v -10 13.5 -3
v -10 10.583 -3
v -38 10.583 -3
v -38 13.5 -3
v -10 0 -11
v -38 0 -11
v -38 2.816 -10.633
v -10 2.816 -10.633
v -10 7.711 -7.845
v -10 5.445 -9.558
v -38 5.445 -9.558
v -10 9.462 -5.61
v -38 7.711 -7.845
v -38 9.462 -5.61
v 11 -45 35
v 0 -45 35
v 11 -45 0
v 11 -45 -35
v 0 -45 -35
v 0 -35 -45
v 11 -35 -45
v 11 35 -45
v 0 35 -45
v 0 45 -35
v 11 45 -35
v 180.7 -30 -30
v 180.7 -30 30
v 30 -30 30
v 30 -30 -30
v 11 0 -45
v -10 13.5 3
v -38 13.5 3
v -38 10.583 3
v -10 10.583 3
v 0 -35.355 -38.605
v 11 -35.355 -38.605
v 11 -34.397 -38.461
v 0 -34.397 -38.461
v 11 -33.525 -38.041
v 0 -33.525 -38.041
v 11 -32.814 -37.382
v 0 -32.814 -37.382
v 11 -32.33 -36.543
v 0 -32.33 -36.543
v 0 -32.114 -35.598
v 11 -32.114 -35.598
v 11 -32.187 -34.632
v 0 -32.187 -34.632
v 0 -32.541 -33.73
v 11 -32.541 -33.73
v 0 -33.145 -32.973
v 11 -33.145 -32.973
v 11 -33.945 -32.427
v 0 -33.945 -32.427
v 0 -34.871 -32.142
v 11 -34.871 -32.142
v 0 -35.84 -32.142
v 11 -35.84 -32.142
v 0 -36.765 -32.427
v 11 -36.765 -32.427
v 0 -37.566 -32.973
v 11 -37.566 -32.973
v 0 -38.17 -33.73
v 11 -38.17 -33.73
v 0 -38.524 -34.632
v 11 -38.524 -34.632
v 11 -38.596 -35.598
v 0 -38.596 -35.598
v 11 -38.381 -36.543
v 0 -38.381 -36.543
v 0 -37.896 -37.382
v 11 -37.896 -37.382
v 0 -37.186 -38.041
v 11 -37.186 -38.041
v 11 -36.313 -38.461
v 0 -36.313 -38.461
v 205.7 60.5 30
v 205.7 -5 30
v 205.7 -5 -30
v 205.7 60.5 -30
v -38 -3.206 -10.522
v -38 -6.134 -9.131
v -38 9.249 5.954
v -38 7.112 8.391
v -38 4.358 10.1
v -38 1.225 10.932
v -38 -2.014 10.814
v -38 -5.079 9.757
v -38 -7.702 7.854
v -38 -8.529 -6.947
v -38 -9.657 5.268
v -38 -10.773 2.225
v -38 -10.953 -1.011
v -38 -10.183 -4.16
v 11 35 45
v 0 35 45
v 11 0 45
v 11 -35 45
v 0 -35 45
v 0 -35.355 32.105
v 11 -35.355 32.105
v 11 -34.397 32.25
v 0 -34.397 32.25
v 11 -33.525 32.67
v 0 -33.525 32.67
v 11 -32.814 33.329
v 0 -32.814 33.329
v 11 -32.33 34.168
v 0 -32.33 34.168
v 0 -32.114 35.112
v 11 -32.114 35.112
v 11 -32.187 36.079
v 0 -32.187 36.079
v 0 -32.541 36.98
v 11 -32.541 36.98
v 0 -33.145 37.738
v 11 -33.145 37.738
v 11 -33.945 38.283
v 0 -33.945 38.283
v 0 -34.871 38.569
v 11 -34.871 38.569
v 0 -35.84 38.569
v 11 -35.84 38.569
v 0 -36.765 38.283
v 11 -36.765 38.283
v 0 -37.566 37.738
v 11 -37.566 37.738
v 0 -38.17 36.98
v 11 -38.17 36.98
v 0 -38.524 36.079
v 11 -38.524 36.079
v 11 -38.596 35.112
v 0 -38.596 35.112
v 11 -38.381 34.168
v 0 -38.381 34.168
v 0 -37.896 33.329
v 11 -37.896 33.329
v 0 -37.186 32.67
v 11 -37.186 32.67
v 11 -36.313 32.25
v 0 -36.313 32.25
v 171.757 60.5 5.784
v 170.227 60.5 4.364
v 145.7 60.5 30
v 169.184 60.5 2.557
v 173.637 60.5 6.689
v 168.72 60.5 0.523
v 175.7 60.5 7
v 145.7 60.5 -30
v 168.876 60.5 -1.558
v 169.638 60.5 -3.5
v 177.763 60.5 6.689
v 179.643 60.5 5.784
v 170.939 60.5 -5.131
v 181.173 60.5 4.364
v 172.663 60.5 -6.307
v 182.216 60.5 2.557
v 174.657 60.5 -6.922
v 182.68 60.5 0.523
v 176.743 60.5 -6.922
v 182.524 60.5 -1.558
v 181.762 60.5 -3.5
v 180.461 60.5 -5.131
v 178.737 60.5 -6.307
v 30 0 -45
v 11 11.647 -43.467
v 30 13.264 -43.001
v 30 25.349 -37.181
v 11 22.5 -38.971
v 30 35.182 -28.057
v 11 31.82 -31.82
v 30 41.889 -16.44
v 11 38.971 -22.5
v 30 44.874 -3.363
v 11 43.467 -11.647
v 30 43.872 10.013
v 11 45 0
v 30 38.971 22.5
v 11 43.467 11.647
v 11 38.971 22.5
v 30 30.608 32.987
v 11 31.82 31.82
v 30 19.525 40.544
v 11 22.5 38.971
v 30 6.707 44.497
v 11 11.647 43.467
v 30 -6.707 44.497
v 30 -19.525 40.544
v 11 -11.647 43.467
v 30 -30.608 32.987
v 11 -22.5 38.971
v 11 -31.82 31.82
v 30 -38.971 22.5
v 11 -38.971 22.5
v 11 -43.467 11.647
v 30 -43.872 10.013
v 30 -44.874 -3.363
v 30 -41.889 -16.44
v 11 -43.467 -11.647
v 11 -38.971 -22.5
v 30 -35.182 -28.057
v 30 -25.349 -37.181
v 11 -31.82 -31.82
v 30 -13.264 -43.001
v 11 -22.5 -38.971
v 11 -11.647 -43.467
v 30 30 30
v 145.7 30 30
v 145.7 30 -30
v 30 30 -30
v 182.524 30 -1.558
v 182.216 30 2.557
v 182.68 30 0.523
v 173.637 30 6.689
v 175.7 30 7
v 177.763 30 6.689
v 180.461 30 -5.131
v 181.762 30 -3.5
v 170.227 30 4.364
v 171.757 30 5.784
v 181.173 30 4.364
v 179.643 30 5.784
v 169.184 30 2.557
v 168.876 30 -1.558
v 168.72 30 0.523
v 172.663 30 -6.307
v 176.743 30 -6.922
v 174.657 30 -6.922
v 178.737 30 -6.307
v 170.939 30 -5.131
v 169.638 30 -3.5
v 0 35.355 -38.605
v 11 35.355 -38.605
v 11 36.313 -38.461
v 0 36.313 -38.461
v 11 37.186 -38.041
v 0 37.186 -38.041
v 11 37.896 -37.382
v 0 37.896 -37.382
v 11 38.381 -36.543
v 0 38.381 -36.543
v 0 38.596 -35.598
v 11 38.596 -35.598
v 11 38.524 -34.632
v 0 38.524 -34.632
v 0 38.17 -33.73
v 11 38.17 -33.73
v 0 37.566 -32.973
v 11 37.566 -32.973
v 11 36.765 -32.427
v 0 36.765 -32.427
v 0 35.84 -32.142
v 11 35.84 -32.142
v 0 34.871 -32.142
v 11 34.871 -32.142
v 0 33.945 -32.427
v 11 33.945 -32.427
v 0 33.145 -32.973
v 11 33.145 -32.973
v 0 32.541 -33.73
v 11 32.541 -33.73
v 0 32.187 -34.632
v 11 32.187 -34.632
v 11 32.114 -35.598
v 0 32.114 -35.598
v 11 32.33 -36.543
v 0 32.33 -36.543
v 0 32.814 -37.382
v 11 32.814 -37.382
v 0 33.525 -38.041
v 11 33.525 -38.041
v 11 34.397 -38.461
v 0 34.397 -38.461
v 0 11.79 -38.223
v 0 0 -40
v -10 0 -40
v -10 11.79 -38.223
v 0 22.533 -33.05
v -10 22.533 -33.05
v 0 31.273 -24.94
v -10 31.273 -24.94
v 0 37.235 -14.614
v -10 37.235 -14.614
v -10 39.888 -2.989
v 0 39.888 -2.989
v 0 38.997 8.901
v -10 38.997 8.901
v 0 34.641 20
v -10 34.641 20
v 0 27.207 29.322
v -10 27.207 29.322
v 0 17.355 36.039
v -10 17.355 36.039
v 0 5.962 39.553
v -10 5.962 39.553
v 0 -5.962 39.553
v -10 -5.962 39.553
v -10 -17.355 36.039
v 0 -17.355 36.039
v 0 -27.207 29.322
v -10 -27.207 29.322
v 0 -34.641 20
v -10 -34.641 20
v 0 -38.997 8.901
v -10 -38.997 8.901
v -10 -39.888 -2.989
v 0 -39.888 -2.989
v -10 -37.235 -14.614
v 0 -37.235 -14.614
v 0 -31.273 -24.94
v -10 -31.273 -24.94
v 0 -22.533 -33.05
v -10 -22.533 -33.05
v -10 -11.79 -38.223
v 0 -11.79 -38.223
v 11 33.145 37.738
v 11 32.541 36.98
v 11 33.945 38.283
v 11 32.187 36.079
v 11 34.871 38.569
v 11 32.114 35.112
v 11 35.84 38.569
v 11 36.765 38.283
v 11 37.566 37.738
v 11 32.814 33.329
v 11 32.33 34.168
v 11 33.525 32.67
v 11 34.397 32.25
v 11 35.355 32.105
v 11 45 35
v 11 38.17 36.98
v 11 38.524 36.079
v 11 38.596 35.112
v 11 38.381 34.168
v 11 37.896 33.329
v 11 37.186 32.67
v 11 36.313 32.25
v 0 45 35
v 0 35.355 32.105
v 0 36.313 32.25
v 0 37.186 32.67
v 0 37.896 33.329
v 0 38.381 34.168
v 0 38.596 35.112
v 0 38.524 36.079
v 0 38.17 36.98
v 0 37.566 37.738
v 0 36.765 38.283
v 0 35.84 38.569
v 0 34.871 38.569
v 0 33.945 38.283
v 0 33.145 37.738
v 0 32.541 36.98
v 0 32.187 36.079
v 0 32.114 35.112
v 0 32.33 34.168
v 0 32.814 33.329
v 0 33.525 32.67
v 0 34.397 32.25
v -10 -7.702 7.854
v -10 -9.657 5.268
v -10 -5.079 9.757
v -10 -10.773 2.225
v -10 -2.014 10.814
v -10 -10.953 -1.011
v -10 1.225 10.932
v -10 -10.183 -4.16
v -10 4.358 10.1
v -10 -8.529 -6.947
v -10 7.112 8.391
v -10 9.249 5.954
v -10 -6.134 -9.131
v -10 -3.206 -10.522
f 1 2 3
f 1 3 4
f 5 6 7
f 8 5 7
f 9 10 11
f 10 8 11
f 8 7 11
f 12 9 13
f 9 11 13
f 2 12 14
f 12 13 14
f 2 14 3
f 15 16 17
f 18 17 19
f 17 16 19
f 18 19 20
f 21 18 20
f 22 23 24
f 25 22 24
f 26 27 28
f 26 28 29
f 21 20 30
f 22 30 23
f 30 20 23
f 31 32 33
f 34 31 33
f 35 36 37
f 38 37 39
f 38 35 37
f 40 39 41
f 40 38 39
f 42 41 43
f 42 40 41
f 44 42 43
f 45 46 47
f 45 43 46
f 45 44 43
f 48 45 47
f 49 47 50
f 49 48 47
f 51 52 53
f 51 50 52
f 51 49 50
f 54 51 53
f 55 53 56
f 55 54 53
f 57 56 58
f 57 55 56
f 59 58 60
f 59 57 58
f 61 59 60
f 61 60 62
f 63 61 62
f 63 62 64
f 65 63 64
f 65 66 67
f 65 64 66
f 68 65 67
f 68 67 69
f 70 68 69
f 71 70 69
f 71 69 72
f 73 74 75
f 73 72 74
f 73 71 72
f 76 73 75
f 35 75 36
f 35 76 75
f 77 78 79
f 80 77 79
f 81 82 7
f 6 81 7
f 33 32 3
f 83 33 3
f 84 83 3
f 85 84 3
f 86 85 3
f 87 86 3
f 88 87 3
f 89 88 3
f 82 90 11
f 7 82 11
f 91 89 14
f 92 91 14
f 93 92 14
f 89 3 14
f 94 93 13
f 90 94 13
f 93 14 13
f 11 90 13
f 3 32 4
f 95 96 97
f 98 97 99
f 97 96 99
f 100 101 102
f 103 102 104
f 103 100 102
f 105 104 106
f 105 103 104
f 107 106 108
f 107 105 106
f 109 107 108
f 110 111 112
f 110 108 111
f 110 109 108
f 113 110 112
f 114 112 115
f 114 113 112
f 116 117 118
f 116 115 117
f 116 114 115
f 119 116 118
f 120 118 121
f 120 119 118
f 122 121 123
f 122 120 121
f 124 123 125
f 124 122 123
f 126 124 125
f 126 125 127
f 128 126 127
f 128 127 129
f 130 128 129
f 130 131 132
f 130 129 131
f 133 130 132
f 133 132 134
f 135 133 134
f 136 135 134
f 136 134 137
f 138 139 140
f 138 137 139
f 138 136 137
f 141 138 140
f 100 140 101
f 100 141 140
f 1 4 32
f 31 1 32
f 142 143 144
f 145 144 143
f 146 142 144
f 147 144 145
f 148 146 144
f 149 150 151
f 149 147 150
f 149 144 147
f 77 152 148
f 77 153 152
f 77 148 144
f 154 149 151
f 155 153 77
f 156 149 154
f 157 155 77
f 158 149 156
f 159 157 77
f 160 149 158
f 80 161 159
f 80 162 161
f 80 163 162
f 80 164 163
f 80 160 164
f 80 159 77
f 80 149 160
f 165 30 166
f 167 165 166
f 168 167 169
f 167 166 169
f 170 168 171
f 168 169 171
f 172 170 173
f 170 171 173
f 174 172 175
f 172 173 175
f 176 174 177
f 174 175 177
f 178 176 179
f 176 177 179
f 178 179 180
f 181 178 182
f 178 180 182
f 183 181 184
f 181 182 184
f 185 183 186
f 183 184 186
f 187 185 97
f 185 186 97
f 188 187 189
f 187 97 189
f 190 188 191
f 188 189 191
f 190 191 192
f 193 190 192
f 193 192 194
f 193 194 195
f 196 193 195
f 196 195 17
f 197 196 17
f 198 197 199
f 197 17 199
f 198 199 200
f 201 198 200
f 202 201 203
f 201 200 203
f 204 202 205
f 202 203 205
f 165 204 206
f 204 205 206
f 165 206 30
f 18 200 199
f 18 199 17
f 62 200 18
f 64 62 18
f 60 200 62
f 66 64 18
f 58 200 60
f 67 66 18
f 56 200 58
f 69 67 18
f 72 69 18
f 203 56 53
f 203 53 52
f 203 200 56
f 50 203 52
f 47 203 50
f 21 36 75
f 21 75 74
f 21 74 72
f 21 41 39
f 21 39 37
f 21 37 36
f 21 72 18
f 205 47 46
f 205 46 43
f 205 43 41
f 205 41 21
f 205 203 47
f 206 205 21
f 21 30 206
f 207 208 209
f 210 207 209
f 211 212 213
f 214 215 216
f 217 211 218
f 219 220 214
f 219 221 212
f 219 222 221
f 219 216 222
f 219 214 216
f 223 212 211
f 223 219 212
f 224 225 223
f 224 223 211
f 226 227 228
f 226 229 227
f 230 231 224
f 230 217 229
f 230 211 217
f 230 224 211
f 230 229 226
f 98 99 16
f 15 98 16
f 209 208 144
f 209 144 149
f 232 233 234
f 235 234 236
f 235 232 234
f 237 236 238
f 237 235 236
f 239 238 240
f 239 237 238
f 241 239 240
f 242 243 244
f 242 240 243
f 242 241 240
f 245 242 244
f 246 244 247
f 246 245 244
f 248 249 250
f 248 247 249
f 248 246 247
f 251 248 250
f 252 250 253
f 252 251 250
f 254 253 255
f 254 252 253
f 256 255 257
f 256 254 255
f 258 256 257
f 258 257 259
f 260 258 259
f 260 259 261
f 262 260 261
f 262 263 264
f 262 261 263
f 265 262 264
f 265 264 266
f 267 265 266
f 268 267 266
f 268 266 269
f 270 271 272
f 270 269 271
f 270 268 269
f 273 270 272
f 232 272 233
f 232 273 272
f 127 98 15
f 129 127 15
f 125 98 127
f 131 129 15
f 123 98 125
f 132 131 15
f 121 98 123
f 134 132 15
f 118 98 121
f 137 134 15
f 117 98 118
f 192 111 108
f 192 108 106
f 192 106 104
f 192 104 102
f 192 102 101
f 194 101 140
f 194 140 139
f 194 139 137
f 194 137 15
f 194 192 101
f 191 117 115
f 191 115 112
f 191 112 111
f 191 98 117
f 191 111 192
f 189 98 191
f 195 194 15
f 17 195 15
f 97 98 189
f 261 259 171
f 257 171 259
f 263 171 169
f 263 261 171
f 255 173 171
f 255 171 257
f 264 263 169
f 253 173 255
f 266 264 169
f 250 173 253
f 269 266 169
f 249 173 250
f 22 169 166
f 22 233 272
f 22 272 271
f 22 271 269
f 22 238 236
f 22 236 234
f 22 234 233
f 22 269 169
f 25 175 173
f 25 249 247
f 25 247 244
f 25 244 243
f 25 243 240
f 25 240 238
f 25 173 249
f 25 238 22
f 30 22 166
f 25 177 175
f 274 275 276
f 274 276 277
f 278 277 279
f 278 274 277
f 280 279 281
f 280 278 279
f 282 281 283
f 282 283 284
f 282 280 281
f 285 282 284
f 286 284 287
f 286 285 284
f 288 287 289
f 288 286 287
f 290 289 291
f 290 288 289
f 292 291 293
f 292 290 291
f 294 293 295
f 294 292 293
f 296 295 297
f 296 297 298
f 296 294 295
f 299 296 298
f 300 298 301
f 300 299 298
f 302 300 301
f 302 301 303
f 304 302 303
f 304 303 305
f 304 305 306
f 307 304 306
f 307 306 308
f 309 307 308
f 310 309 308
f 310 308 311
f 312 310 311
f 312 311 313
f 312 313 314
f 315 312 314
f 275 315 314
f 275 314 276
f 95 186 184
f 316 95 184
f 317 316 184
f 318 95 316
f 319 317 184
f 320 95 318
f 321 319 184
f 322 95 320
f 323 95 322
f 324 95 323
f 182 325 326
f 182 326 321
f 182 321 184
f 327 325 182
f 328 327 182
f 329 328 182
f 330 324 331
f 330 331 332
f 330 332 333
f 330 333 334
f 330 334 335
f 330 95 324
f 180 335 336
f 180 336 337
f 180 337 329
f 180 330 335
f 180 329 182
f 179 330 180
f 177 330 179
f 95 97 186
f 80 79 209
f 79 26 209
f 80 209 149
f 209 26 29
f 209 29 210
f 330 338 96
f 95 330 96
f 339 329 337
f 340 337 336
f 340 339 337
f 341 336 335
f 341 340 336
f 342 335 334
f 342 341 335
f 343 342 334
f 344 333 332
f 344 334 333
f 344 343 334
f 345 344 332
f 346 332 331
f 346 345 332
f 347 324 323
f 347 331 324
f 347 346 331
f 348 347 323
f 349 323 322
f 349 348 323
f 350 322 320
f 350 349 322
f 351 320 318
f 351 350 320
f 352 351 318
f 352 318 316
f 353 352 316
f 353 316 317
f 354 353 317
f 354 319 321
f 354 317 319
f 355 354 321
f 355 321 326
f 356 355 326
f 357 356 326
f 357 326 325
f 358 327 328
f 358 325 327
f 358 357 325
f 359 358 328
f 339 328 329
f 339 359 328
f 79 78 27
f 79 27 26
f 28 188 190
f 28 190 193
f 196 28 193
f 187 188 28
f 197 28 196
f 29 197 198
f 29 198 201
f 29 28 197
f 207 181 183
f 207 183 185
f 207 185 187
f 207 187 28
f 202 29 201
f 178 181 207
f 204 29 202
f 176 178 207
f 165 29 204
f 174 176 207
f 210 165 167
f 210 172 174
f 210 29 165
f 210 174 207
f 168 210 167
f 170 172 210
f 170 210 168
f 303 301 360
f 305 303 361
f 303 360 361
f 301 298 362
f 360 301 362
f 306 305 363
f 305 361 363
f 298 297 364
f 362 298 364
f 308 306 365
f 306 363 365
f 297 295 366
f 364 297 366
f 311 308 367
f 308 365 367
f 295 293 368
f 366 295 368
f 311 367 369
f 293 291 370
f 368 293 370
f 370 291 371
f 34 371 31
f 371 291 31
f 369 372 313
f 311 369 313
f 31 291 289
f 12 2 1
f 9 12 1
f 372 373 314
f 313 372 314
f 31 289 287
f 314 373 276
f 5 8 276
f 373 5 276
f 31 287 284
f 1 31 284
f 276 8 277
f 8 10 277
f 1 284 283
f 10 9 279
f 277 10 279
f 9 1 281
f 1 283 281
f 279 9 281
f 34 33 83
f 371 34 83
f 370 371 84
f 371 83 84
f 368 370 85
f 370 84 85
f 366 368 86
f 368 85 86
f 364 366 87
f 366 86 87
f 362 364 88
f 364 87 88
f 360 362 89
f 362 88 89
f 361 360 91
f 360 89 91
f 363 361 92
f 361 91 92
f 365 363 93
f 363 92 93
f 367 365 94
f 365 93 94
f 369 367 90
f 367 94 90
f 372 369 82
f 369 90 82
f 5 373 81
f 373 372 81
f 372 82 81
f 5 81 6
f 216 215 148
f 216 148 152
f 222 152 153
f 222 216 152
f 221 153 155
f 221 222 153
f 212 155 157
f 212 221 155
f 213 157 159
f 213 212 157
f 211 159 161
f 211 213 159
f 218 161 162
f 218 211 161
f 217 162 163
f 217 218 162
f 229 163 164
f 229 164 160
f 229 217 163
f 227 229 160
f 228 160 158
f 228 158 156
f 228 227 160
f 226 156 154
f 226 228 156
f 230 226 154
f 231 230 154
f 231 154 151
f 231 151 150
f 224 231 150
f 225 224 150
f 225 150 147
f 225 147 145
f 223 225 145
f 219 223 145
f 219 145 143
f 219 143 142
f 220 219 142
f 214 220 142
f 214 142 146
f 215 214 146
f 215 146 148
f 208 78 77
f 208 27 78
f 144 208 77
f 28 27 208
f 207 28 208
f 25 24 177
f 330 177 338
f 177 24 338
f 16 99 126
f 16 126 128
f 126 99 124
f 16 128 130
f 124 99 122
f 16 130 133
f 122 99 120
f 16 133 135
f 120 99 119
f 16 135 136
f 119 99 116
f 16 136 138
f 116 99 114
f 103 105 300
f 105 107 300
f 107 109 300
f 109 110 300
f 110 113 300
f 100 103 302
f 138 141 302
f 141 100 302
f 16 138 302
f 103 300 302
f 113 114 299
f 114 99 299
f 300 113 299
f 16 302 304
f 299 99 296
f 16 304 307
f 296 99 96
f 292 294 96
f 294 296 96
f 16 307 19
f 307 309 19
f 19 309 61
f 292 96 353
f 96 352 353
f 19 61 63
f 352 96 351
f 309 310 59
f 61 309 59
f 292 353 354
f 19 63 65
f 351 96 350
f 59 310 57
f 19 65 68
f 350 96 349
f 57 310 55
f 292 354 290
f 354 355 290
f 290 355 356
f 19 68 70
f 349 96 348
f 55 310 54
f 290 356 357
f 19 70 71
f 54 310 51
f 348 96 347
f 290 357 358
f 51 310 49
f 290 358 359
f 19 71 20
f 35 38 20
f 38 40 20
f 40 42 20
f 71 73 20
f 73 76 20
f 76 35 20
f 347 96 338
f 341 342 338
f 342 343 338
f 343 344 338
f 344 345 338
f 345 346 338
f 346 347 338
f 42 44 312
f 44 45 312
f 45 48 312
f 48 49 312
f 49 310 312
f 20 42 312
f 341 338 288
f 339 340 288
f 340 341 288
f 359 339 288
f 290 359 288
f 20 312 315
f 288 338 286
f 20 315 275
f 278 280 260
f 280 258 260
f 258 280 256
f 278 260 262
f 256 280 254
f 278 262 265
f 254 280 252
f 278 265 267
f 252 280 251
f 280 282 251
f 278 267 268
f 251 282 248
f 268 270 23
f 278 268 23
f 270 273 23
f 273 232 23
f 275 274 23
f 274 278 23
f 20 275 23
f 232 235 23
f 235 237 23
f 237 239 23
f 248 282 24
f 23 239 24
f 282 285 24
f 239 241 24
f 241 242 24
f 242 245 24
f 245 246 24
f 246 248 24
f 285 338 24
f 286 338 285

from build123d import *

# Parameters (mm, degrees)
BOSS_EXTRUDE1_DEPTH      = 10
BOSS_EXTRUDE1_DEPTH_BACK = 38
BOSS_EXTRUDE2_START      = -10
SKETCH1_3_R              = 40
BOSS_EXTRUDE2_DEPTH      = 10
SKETCH1_4_R              = 45
SKETCH1_4_R_2            = 11
BOSS_EXTRUDE3_DEPTH      = 9
SKETCH2_R                = 45
SKETCH2_W                = 60
SKETCH2_H                = 60
BOSS_EXTRUDE4_DEPTH      = 30
SKETCH2_3_W              = 60
SKETCH2_3_H              = 60
BOSS_EXTRUDE5_DEPTH      = 205.7
SKETCH3_W                = 60
SKETCH3_H                = 60
SKETCH3_R                = 7
BOSS_EXTRUDE6_DEPTH      = 60.5
CHAMFER1_SIZE            = 25
BOSS_EXTRUDE7_DEPTH      = 11
SKETCH7_R                = 3.25
CUT_EXTRUDE2_DEPTH       = 51


with BuildPart() as part:
    # Sketch1 → Boss-Extrude1 (new, two sides: drawn at the far end of the back side and taken through both)
    with BuildSketch(Plane(origin=(0, 0, 0), x_dir=(0, 0, -1), z_dir=(1, 0, 0)).offset(-BOSS_EXTRUDE1_DEPTH_BACK)):
        with BuildLine():
            Line((3, 10.583005244), (3, 13.5))
            Line((3, 13.5), (-3, 13.5))
            Line((-3, 13.5), (-3, 10.583005244))
            ThreePointArc((-3, 10.583005244), (0, -11), (3, 10.583005244))
        make_face()
    extrude(amount=BOSS_EXTRUDE1_DEPTH + BOSS_EXTRUDE1_DEPTH_BACK)

    # Sketch1<3> → Boss-Extrude2 (add)
    with BuildSketch(Plane(origin=(0, 0, 0), x_dir=(0, 0, -1), z_dir=(1, 0, 0)).offset(BOSS_EXTRUDE2_START)):
        Circle(SKETCH1_3_R)
        with BuildLine():
            Line((-3, 13.5), (3, 13.5))
            Line((3, 13.5), (3, 10.583005244))
            ThreePointArc((3, 10.583005244), (8.774964387, 6.633249581), (11, 0))
            ThreePointArc((11, 0), (-6.633249581, -8.774964387), (-3, 10.583005244))
            Line((-3, 10.583005244), (-3, 13.5))
        make_face(mode=Mode.SUBTRACT)
    extrude(amount=BOSS_EXTRUDE2_DEPTH)



with BuildPart() as body_2:
    # Sketch1<4> → Boss-Extrude3 (new body)
    with BuildSketch(Plane(origin=(0, 0, 0), x_dir=(0, 0, -1), z_dir=(1, 0, 0))):
        Circle(SKETCH1_4_R)
        Circle(SKETCH1_4_R_2, mode=Mode.SUBTRACT)
    extrude(amount=BOSS_EXTRUDE3_DEPTH)


with BuildPart() as part_1:
    add(part.part)

    add(body_2.part)  # Boss-Extrude4 merges body 2
    # Sketch2 → Boss-Extrude4 (add)
    with BuildSketch(Plane(origin=(0, 0, 0), x_dir=(0, 0, -1), z_dir=(1, 0, 0))):
        Circle(SKETCH2_R)
        Rectangle(SKETCH2_W, SKETCH2_H, mode=Mode.SUBTRACT)
    extrude(amount=BOSS_EXTRUDE4_DEPTH)

    # Sketch2<3> → Boss-Extrude5 (add)
    with BuildSketch(Plane(origin=(0, 0, 0), x_dir=(0, 0, -1), z_dir=(1, 0, 0))):
        Rectangle(SKETCH2_3_W, SKETCH2_3_H)
    extrude(amount=BOSS_EXTRUDE5_DEPTH)

    # Sketch3 → Boss-Extrude6 (add)
    with BuildSketch(Plane(origin=(0, 0, 0), x_dir=(1, 0, 0), z_dir=(0, 1, 0))):
        with Locations((175.7, 0)):
            Rectangle(SKETCH3_W, SKETCH3_H)
        with Locations((175.7, 0)):
            Circle(SKETCH3_R, mode=Mode.SUBTRACT)
    extrude(amount=BOSS_EXTRUDE6_DEPTH)

    # Chamfer1
    chamfer1_edges = [part_1.edges().sort_by_distance(p)[0] for p in [
        (205.7, -30, 0),
    ]]
    chamfer(chamfer1_edges, length=CHAMFER1_SIZE)

    # Sketch6 → Boss-Extrude7 (add)
    with BuildSketch(Plane(origin=(0, 0, 0), x_dir=(0, 0, -1), z_dir=(1, 0, 0))):
        Polygon((45, 35), (35, 45), (-35, 45), (-45, 35), (-45, -35), (-35, -45), (35, -45), (45, -35), align=None)
    extrude(amount=BOSS_EXTRUDE7_DEPTH)

    # Sketch7 → Cut-Extrude2 (cut)
    with BuildSketch(Plane(origin=(0, 0, 0), x_dir=(0, 0, -1), z_dir=(1, 0, 0))):
        with Locations((35.355339059, 35.355339059)):
            Circle(SKETCH7_R)
        with Locations((35.355339059, -35.355339059)):
            Circle(SKETCH7_R)
        with Locations((-35.355339059, 35.355339059)):
            Circle(SKETCH7_R)
        with Locations((-35.355339059, -35.355339059)):
            Circle(SKETCH7_R)
    extrude(amount=CUT_EXTRUDE2_DEPTH, mode=Mode.SUBTRACT)


solid = part_1.part
